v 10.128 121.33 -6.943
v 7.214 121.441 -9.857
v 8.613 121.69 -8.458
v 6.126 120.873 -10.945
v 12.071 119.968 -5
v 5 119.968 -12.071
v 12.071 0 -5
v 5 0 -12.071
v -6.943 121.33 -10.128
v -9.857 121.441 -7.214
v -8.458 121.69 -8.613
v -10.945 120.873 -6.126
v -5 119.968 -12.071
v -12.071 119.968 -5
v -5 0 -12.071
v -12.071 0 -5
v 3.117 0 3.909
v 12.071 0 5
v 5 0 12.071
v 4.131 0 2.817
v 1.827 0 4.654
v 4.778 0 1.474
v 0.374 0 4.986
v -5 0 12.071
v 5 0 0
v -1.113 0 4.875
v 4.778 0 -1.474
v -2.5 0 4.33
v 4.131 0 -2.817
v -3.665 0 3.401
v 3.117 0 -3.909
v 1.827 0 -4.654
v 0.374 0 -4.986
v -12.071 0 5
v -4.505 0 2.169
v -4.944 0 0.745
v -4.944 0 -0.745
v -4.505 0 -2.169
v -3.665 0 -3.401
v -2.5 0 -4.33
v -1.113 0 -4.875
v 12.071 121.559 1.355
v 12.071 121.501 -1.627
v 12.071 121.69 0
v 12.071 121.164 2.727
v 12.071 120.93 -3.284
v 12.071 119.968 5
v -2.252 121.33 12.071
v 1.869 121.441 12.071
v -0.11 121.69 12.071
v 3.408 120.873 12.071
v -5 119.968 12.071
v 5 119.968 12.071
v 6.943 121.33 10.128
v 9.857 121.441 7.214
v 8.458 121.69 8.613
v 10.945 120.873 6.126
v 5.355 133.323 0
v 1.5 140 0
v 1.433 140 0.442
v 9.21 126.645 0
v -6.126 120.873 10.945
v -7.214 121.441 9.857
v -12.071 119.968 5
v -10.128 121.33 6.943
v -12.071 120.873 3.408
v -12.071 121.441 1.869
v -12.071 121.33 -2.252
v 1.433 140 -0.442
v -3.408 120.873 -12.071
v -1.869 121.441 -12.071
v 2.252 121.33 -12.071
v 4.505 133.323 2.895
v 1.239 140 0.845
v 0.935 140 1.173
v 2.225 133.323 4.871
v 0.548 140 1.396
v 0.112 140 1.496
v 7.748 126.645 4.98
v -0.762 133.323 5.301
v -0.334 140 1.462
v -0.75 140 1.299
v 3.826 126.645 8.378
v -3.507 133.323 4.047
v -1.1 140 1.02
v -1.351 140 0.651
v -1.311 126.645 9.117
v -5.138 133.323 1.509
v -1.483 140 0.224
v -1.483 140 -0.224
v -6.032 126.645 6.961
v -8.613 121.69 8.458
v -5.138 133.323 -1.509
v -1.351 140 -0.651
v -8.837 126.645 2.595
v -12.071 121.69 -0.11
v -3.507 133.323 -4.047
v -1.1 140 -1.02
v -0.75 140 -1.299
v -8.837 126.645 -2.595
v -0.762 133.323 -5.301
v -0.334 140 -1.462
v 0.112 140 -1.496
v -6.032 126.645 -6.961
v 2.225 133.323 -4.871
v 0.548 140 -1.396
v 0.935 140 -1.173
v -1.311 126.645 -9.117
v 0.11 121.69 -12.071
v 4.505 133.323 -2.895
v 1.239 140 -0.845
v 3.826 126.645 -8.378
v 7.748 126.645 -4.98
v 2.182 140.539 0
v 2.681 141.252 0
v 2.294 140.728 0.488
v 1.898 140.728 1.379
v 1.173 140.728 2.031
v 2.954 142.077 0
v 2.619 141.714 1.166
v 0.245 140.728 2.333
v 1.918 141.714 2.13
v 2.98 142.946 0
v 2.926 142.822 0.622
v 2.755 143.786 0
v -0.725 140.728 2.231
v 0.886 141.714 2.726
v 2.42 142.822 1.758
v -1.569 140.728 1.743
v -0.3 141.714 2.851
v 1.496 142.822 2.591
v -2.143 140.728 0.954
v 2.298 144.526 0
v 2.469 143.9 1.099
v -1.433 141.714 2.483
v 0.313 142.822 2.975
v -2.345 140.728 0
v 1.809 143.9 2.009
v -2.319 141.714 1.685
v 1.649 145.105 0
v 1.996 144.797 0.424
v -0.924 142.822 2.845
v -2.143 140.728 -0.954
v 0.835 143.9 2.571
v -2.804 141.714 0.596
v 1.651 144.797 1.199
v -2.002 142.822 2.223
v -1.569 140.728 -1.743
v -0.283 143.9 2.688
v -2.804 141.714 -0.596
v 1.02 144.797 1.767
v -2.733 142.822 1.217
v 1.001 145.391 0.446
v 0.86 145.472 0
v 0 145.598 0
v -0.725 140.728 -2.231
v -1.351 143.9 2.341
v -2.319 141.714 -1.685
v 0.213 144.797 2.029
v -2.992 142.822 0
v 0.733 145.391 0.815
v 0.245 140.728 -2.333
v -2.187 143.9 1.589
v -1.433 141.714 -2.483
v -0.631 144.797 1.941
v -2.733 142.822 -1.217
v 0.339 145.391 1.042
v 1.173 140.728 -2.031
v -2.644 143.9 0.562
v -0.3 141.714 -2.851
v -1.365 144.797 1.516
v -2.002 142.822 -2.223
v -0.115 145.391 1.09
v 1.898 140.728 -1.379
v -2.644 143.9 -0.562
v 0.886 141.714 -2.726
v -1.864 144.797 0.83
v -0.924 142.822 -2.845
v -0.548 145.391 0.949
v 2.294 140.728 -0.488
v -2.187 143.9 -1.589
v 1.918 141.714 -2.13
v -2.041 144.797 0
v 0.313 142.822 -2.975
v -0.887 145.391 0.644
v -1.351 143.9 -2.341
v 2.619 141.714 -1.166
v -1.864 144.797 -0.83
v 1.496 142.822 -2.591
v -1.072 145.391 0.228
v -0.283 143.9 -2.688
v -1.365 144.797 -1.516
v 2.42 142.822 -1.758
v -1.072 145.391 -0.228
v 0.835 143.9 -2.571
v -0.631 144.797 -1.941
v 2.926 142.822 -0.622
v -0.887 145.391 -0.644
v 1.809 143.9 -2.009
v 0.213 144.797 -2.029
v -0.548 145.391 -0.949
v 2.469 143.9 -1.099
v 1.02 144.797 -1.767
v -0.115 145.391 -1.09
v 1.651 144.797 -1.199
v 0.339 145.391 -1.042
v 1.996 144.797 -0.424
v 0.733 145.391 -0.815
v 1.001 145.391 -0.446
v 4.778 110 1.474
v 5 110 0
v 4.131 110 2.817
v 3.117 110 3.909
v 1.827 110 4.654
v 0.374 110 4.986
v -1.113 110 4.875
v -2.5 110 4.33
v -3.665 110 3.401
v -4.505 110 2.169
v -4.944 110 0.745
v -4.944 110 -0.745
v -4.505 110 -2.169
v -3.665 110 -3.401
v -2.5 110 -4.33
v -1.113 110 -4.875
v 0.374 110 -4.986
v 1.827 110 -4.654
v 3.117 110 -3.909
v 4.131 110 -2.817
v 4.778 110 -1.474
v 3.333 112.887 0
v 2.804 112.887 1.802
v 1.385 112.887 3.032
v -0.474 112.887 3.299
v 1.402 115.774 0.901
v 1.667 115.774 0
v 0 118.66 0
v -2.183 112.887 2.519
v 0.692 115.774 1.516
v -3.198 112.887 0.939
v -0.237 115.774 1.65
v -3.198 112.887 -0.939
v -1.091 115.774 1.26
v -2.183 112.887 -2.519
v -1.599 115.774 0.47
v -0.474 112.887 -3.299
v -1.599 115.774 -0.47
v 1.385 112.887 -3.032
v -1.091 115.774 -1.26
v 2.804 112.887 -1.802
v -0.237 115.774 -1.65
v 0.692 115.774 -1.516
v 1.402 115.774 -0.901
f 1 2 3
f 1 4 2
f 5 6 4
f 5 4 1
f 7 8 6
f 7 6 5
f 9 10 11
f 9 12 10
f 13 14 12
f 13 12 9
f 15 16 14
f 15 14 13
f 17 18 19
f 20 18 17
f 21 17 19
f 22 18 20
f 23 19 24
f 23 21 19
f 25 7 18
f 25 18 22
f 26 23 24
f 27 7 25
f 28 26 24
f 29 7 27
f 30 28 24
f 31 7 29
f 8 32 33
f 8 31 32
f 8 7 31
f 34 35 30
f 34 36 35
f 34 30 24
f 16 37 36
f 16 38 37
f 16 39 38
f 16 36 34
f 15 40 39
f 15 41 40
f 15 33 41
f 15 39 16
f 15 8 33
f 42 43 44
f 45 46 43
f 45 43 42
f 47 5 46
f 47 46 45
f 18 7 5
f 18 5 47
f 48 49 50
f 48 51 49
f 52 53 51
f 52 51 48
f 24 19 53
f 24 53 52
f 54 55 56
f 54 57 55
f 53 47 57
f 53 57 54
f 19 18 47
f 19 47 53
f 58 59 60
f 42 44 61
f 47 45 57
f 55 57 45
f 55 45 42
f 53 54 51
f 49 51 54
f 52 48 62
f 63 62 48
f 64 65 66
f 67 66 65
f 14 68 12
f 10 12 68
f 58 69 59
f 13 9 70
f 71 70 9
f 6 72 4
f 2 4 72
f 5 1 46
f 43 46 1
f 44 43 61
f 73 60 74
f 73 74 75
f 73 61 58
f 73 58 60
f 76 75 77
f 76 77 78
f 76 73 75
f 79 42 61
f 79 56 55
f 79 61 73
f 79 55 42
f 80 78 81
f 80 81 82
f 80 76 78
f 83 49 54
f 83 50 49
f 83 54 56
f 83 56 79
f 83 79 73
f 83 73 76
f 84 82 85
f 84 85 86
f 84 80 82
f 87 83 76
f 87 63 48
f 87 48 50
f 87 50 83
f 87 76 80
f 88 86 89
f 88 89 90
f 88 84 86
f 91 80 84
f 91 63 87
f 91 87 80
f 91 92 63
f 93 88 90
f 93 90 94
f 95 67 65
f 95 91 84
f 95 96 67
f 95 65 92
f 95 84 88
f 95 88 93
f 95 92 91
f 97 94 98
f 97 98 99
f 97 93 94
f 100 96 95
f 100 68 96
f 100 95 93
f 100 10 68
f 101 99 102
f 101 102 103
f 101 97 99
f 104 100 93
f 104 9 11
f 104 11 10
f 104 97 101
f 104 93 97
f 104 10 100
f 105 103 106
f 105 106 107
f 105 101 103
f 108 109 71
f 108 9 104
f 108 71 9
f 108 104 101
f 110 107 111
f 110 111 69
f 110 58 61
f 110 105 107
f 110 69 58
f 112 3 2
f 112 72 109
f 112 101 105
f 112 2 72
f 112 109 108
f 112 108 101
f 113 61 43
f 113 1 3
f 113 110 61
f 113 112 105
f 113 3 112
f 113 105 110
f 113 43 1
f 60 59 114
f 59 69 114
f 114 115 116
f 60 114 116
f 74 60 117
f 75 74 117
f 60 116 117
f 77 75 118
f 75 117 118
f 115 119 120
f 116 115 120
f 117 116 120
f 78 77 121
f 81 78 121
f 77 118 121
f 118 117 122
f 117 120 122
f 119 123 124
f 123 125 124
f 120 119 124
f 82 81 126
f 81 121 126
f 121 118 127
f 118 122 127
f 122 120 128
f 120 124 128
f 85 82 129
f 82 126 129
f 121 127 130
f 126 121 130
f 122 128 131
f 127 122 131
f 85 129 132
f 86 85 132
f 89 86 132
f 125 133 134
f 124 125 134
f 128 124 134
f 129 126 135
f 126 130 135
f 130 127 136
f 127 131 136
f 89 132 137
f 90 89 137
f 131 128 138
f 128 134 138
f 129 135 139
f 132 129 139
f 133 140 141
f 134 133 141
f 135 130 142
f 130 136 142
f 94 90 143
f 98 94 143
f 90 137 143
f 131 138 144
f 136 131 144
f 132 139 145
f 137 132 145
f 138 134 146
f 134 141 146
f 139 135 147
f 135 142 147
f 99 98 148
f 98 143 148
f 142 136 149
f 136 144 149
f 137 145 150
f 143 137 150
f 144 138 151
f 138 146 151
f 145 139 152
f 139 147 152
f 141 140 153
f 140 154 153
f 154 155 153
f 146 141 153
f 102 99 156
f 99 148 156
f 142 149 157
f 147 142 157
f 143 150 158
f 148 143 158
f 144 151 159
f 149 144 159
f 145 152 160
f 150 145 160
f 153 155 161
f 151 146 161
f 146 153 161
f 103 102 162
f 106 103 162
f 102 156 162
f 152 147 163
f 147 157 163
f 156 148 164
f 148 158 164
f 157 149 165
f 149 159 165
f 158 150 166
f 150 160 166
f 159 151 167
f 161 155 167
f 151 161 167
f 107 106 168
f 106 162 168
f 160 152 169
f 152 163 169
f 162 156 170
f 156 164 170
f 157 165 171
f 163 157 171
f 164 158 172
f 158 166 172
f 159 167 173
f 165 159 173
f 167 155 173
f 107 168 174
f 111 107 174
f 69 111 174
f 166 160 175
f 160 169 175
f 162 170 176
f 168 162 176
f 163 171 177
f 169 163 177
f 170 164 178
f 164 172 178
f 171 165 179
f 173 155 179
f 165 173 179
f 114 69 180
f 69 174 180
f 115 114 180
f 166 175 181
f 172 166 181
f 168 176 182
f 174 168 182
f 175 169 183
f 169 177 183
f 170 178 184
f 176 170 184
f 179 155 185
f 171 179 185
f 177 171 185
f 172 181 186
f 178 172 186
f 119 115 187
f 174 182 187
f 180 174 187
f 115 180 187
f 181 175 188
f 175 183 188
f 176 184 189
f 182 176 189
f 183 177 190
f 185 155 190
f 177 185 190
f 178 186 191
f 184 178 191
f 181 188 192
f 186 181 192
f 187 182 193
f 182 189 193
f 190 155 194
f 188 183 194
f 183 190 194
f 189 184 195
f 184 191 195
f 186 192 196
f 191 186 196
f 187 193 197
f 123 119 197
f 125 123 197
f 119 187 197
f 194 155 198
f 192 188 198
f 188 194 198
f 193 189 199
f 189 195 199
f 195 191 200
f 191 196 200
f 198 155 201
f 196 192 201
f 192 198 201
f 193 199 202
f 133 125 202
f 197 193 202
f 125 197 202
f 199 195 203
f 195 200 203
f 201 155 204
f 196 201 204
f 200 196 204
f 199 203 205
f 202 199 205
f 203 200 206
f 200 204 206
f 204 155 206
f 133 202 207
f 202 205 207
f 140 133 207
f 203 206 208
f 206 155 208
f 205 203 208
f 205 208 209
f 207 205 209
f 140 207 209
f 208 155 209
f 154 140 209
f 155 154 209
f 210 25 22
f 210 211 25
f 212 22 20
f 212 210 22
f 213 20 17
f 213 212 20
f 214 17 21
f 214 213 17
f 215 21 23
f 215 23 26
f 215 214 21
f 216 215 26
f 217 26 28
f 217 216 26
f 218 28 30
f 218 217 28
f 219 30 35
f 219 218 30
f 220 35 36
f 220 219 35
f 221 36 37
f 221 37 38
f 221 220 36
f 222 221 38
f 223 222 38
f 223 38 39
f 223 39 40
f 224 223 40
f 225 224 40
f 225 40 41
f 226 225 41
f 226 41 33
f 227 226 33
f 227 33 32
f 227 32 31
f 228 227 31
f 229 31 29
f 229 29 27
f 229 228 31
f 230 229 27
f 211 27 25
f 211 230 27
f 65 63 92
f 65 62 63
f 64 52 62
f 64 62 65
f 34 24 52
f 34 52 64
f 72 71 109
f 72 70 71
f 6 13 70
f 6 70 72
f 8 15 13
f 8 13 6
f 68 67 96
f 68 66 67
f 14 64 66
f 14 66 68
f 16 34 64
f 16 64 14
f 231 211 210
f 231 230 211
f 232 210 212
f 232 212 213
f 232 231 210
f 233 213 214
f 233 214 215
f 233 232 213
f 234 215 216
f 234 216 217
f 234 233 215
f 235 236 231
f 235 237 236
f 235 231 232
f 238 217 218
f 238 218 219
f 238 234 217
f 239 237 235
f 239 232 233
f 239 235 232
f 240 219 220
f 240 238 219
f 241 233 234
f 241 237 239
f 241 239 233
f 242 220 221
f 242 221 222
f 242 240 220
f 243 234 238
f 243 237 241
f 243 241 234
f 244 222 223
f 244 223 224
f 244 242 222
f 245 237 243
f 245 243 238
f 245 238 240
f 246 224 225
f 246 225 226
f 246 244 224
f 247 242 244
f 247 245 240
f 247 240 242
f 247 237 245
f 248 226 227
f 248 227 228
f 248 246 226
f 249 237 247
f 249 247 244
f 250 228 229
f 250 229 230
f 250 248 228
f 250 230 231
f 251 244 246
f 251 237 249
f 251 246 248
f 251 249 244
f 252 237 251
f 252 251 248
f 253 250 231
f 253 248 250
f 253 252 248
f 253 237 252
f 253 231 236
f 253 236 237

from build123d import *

# Parameters (mm, degrees)
BOSS_EXTRUDE1_DEPTH = 140


with BuildPart() as part:
    # Sketch1 → Boss-Extrude1 (new body)
    with BuildSketch(Plane(origin=(0, 0, 0), x_dir=(1, 0, 0), z_dir=(0, 1, 0))):
        Polygon((-12.071067812, -5), (-12.071067812, 5), (-5, 12.071067812), (5, 12.071067812), (12.071067812, 5), (12.071067812, -5), (5, -12.071067812), (-5, -12.071067812), align=None)
    extrude(amount=BOSS_EXTRUDE1_DEPTH)

    # Sketch3 → Cut-Revolve2 (revolve, cut)
    with BuildSketch(Plane.XY):
        Polygon((1.5, 140), (14.42266182, 117.617293159), (14.42266182, 140), align=None)
    revolve(axis=Axis((0, 140, 0), (0, -1, 0)), mode=Mode.SUBTRACT)

    # Sketch4 → Revolve1 (revolve)
    with BuildSketch(Plane.XY):
        with BuildLine():
            Line((0, 145.598076211), (0, 140))
            Line((0, 140), (1.5, 140))
            ThreePointArc((1.5, 140), (2.897777479, 143.374533347), (0, 145.598076211))
        make_face()
    revolve(axis=Axis((0, 145.598076211, 0), (0, -1, 0)))

    # Sketch5 → Cut-Revolve3 (revolve, cut)
    with BuildSketch(Plane.XY):
        Polygon((0, 0), (5, 0), (5, 110), (0, 118.660254038), align=None)
    revolve(axis=Axis((0, 118.660254038, 0), (0, -1, 0)), mode=Mode.SUBTRACT)


solid = part.part
